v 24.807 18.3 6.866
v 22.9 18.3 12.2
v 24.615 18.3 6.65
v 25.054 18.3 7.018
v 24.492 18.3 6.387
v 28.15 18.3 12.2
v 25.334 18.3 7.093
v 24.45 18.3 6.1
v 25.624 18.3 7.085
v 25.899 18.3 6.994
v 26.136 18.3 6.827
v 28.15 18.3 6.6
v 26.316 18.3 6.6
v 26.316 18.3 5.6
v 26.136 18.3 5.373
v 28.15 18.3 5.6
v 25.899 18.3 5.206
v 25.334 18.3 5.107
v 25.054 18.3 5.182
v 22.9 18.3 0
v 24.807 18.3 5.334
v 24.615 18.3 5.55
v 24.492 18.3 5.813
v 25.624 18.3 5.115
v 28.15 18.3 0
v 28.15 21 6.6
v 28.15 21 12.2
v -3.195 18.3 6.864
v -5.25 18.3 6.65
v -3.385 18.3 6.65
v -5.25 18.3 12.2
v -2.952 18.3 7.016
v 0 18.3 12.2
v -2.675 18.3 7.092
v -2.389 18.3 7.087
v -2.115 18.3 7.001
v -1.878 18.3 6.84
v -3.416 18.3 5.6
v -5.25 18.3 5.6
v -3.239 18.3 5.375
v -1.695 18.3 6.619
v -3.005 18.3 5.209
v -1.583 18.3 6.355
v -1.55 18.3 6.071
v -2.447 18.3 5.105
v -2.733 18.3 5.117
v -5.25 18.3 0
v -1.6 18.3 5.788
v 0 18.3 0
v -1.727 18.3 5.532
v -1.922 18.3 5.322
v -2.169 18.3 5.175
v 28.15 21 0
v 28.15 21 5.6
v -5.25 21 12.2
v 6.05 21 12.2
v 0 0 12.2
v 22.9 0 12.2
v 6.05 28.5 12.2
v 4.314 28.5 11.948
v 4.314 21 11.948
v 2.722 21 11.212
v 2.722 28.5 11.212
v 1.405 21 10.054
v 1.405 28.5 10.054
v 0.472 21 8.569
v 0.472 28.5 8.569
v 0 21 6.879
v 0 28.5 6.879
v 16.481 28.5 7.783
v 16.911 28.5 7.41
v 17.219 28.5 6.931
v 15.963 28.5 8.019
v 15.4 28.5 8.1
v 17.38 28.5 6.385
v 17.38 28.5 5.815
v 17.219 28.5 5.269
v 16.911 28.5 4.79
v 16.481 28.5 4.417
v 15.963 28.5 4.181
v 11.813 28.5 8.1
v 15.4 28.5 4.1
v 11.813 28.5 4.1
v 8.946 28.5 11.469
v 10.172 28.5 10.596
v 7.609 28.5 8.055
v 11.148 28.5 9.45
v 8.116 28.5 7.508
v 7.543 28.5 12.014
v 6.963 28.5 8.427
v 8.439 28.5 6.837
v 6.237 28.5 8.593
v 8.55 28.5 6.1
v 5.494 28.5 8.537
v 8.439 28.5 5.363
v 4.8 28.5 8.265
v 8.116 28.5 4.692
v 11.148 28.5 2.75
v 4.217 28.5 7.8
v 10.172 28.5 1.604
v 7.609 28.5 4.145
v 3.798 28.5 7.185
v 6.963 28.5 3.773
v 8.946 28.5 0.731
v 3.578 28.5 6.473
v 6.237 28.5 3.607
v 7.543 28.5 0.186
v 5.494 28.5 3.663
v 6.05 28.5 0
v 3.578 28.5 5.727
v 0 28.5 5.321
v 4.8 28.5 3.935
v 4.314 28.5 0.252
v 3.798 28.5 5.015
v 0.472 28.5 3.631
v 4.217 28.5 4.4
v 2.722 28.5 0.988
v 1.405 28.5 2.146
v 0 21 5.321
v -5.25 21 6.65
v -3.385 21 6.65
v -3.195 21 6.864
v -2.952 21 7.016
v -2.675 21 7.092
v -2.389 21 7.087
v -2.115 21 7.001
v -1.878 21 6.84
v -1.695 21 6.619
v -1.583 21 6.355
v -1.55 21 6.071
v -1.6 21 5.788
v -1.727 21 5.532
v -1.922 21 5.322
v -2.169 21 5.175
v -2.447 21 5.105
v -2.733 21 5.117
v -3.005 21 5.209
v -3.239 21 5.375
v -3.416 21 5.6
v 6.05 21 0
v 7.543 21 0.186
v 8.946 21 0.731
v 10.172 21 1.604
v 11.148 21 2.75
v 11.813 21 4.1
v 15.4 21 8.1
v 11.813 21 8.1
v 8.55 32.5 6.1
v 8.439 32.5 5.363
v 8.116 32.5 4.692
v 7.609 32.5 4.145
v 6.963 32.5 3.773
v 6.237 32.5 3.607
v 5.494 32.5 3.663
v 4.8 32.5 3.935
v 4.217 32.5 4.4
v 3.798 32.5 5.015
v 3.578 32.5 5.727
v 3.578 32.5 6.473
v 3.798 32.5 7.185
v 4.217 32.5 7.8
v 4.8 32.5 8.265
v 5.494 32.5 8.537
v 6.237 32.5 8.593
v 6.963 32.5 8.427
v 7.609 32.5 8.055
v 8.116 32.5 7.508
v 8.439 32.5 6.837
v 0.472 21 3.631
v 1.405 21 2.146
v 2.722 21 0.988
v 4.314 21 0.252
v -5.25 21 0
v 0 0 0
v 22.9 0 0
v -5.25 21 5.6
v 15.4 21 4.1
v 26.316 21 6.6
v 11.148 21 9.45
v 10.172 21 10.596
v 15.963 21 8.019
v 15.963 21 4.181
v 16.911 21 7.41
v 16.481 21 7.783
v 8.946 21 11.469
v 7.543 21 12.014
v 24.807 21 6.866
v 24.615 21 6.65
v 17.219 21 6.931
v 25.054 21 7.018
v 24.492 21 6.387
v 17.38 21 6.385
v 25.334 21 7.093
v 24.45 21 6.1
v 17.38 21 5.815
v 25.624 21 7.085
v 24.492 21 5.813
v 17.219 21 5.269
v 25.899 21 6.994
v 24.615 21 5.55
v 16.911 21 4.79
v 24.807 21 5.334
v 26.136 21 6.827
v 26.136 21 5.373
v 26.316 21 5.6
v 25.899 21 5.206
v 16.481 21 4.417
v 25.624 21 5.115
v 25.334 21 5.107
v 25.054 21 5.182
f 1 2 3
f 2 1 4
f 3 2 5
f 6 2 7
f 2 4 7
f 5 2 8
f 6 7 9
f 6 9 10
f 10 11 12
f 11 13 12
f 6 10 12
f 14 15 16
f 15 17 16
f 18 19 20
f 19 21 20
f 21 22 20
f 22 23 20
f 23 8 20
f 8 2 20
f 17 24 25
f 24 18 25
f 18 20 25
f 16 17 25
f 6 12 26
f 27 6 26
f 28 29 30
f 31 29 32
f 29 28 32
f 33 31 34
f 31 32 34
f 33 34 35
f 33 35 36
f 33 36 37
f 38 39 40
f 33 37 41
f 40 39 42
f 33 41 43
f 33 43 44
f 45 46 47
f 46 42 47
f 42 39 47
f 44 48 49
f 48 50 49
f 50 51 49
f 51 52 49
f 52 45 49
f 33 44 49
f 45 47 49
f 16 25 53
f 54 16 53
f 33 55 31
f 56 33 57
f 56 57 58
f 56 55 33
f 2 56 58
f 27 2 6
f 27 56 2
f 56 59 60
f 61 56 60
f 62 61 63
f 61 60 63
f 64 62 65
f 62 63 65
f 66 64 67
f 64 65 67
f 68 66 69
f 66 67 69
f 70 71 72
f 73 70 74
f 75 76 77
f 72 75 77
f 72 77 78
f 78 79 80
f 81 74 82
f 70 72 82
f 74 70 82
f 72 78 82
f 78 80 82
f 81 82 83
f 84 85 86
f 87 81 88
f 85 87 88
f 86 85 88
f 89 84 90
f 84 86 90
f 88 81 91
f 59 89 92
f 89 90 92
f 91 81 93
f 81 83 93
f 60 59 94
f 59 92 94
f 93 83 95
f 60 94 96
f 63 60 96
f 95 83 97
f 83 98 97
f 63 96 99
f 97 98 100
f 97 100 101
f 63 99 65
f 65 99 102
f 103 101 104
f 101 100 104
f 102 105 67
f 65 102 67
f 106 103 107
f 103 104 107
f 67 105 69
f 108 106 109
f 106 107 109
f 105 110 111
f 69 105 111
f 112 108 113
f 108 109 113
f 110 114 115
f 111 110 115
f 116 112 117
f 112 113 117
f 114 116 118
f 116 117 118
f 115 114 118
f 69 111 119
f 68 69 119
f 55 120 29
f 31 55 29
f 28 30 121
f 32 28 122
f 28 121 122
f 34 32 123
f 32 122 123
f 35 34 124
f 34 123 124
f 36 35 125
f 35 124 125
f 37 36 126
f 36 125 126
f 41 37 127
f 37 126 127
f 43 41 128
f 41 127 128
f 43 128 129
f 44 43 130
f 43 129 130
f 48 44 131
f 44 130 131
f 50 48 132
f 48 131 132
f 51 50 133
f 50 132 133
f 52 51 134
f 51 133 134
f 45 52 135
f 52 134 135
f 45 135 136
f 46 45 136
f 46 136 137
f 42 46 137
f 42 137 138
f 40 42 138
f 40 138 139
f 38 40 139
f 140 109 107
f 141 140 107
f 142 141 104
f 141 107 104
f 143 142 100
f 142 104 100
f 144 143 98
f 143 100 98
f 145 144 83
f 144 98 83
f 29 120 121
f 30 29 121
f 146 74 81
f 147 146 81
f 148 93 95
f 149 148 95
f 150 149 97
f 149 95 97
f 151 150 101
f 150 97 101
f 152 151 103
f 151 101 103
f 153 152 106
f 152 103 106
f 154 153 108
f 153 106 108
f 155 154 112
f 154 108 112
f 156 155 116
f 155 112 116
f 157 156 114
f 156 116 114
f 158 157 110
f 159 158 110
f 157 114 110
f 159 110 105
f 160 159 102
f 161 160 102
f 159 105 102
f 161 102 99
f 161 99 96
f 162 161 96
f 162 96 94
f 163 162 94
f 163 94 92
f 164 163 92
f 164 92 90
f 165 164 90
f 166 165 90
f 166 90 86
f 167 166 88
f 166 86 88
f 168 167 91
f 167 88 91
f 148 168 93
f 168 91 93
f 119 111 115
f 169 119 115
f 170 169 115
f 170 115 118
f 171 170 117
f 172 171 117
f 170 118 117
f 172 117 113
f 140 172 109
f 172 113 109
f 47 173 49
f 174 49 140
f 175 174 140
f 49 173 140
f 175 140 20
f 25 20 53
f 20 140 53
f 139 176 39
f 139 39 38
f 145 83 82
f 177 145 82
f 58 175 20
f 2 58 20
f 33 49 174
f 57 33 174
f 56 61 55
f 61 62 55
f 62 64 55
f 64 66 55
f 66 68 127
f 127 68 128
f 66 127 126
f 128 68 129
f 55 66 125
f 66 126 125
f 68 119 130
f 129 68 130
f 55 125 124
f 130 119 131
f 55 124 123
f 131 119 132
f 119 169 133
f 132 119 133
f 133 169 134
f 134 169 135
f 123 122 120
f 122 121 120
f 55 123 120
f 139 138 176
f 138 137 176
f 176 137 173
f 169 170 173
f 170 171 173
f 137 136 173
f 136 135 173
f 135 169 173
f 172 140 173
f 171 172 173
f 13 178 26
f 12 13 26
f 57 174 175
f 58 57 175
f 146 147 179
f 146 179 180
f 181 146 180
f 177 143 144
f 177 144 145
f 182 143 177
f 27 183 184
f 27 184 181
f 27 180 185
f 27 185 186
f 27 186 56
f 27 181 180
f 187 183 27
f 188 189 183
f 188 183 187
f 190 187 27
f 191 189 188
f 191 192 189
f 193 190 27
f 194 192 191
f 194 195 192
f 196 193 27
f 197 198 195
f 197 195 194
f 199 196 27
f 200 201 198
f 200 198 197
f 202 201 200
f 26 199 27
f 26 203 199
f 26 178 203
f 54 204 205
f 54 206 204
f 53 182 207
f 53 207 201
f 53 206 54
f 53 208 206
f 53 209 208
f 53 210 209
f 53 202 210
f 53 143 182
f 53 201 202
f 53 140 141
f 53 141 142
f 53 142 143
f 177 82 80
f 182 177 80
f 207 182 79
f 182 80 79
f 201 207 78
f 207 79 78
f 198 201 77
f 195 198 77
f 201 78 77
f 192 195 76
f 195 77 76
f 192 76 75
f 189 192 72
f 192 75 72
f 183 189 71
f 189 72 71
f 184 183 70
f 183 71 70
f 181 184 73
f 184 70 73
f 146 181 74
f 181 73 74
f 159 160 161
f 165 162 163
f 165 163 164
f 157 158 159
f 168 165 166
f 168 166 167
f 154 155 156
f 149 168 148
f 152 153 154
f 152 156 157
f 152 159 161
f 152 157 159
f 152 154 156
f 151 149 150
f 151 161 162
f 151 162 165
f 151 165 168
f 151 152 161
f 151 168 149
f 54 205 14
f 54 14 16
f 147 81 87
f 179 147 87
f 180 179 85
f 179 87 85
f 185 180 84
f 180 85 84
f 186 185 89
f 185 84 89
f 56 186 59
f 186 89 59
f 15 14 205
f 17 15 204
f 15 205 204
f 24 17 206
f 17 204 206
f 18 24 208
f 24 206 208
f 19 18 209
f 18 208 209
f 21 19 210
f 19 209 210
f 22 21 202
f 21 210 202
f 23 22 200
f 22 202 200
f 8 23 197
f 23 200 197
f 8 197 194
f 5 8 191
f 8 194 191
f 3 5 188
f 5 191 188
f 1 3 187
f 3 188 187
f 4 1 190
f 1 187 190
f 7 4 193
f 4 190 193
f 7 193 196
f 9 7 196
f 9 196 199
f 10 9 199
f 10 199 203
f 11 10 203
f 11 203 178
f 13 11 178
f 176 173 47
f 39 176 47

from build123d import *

# Parameters (mm, degrees)
BOSS_EXTRUDE1_DEPTH = 12.2
SKETCH2_R           = 1
CUT_EXTRUDE1_DEPTH  = 12.5
SKETCH3_R           = 2.5
BOSS_EXTRUDE2_DEPTH = 4
CUT_EXTRUDE2_DEPTH  = 7.5
SKETCH5_W           = 2.772136711
SKETCH5_H           = 1.05
SKETCH5_W_2         = 2.613565213
SKETCH5_H_2         = 1
CUT_EXTRUDE3_DEPTH  = 7.5


with BuildPart() as part:
    # Sketch1 → Boss-Extrude1 (new body)
    with BuildSketch(Plane.XY):
        Polygon((-5.25, 21), (-5.25, 18.3), (0, 18.3), (0, 0), (22.9, 0), (22.9, 18.3), (28.15, 18.3), (28.15, 21), (22.9, 21), (22.9, 28.5), (0, 28.5), (0, 21), align=None)
    extrude(amount=BOSS_EXTRUDE1_DEPTH)

    # Sketch2 → Cut-Extrude1 (cut)
    with BuildSketch(Plane(origin=(0, 21, 0), x_dir=(1, 0, 0), z_dir=(0, 1, 0))):
        with Locations((-2.55, -6.1)):
            Circle(SKETCH2_R)
        with Locations((25.45, -6.1)):
            Circle(SKETCH2_R)
    extrude(amount=-CUT_EXTRUDE1_DEPTH, mode=Mode.SUBTRACT)

    # Sketch3 → Boss-Extrude2 (add)
    with BuildSketch(Plane(origin=(0, 28.5, 0), x_dir=(1, 0, 0), z_dir=(0, 1, 0))):
        with Locations((6.05, -6.1)):
            Circle(SKETCH3_R)
    extrude(amount=BOSS_EXTRUDE2_DEPTH)

    # Sketch4 → Cut-Extrude2 (cut)
    with BuildSketch(Plane(origin=(0, 28.5, 0), x_dir=(1, 0, 0), z_dir=(0, 1, 0))):
        with BuildLine():
            Line((6.050000045, 0), (0, 0))
            Line((0, 0), (0, -5.320577137))
            ThreePointArc((0, -5.320577137), (2.021630587, -1.519362504), (6.050000045, 0))
        make_face()
        with BuildLine():
            Line((22.9, 0), (6.050000045, 0))
            ThreePointArc((6.050000045, 0), (9.58624096, -1.129587555), (11.812811814, -4.1))
            Line((11.812811814, -4.1), (15.4, -4.1))
            ThreePointArc((15.4, -4.1), (17.4, -6.1), (15.4, -8.1))
            Line((15.4, -8.1), (11.812811814, -8.1))
            ThreePointArc((11.812811814, -8.1), (9.586240956, -11.070412448), (6.050000034, -12.2))
            Line((6.050000034, -12.2), (22.9, -12.2))
            Line((22.9, -12.2), (22.9, 0))
        make_face()
        with BuildLine():
            ThreePointArc((6.050000034, -12.2), (2.021630582, -10.680637492), (0, -6.879422863))
            Line((0, -6.879422863), (0, -12.2))
            Line((0, -12.2), (6.050000034, -12.2))
        make_face()
    extrude(amount=-CUT_EXTRUDE2_DEPTH, mode=Mode.SUBTRACT)

    # Sketch5 → Cut-Extrude3 (cut)
    with BuildSketch(Plane(origin=(0, 21, 0), x_dir=(1, 0, 0), z_dir=(0, 1, 0))):
        with Locations((-3.863931645, -6.125)):
            Rectangle(SKETCH5_W, SKETCH5_H)
        with Locations((26.843217394, -6.1)):
            Rectangle(SKETCH5_W_2, SKETCH5_H_2)
    extrude(amount=-CUT_EXTRUDE3_DEPTH, mode=Mode.SUBTRACT)


solid = part.part
